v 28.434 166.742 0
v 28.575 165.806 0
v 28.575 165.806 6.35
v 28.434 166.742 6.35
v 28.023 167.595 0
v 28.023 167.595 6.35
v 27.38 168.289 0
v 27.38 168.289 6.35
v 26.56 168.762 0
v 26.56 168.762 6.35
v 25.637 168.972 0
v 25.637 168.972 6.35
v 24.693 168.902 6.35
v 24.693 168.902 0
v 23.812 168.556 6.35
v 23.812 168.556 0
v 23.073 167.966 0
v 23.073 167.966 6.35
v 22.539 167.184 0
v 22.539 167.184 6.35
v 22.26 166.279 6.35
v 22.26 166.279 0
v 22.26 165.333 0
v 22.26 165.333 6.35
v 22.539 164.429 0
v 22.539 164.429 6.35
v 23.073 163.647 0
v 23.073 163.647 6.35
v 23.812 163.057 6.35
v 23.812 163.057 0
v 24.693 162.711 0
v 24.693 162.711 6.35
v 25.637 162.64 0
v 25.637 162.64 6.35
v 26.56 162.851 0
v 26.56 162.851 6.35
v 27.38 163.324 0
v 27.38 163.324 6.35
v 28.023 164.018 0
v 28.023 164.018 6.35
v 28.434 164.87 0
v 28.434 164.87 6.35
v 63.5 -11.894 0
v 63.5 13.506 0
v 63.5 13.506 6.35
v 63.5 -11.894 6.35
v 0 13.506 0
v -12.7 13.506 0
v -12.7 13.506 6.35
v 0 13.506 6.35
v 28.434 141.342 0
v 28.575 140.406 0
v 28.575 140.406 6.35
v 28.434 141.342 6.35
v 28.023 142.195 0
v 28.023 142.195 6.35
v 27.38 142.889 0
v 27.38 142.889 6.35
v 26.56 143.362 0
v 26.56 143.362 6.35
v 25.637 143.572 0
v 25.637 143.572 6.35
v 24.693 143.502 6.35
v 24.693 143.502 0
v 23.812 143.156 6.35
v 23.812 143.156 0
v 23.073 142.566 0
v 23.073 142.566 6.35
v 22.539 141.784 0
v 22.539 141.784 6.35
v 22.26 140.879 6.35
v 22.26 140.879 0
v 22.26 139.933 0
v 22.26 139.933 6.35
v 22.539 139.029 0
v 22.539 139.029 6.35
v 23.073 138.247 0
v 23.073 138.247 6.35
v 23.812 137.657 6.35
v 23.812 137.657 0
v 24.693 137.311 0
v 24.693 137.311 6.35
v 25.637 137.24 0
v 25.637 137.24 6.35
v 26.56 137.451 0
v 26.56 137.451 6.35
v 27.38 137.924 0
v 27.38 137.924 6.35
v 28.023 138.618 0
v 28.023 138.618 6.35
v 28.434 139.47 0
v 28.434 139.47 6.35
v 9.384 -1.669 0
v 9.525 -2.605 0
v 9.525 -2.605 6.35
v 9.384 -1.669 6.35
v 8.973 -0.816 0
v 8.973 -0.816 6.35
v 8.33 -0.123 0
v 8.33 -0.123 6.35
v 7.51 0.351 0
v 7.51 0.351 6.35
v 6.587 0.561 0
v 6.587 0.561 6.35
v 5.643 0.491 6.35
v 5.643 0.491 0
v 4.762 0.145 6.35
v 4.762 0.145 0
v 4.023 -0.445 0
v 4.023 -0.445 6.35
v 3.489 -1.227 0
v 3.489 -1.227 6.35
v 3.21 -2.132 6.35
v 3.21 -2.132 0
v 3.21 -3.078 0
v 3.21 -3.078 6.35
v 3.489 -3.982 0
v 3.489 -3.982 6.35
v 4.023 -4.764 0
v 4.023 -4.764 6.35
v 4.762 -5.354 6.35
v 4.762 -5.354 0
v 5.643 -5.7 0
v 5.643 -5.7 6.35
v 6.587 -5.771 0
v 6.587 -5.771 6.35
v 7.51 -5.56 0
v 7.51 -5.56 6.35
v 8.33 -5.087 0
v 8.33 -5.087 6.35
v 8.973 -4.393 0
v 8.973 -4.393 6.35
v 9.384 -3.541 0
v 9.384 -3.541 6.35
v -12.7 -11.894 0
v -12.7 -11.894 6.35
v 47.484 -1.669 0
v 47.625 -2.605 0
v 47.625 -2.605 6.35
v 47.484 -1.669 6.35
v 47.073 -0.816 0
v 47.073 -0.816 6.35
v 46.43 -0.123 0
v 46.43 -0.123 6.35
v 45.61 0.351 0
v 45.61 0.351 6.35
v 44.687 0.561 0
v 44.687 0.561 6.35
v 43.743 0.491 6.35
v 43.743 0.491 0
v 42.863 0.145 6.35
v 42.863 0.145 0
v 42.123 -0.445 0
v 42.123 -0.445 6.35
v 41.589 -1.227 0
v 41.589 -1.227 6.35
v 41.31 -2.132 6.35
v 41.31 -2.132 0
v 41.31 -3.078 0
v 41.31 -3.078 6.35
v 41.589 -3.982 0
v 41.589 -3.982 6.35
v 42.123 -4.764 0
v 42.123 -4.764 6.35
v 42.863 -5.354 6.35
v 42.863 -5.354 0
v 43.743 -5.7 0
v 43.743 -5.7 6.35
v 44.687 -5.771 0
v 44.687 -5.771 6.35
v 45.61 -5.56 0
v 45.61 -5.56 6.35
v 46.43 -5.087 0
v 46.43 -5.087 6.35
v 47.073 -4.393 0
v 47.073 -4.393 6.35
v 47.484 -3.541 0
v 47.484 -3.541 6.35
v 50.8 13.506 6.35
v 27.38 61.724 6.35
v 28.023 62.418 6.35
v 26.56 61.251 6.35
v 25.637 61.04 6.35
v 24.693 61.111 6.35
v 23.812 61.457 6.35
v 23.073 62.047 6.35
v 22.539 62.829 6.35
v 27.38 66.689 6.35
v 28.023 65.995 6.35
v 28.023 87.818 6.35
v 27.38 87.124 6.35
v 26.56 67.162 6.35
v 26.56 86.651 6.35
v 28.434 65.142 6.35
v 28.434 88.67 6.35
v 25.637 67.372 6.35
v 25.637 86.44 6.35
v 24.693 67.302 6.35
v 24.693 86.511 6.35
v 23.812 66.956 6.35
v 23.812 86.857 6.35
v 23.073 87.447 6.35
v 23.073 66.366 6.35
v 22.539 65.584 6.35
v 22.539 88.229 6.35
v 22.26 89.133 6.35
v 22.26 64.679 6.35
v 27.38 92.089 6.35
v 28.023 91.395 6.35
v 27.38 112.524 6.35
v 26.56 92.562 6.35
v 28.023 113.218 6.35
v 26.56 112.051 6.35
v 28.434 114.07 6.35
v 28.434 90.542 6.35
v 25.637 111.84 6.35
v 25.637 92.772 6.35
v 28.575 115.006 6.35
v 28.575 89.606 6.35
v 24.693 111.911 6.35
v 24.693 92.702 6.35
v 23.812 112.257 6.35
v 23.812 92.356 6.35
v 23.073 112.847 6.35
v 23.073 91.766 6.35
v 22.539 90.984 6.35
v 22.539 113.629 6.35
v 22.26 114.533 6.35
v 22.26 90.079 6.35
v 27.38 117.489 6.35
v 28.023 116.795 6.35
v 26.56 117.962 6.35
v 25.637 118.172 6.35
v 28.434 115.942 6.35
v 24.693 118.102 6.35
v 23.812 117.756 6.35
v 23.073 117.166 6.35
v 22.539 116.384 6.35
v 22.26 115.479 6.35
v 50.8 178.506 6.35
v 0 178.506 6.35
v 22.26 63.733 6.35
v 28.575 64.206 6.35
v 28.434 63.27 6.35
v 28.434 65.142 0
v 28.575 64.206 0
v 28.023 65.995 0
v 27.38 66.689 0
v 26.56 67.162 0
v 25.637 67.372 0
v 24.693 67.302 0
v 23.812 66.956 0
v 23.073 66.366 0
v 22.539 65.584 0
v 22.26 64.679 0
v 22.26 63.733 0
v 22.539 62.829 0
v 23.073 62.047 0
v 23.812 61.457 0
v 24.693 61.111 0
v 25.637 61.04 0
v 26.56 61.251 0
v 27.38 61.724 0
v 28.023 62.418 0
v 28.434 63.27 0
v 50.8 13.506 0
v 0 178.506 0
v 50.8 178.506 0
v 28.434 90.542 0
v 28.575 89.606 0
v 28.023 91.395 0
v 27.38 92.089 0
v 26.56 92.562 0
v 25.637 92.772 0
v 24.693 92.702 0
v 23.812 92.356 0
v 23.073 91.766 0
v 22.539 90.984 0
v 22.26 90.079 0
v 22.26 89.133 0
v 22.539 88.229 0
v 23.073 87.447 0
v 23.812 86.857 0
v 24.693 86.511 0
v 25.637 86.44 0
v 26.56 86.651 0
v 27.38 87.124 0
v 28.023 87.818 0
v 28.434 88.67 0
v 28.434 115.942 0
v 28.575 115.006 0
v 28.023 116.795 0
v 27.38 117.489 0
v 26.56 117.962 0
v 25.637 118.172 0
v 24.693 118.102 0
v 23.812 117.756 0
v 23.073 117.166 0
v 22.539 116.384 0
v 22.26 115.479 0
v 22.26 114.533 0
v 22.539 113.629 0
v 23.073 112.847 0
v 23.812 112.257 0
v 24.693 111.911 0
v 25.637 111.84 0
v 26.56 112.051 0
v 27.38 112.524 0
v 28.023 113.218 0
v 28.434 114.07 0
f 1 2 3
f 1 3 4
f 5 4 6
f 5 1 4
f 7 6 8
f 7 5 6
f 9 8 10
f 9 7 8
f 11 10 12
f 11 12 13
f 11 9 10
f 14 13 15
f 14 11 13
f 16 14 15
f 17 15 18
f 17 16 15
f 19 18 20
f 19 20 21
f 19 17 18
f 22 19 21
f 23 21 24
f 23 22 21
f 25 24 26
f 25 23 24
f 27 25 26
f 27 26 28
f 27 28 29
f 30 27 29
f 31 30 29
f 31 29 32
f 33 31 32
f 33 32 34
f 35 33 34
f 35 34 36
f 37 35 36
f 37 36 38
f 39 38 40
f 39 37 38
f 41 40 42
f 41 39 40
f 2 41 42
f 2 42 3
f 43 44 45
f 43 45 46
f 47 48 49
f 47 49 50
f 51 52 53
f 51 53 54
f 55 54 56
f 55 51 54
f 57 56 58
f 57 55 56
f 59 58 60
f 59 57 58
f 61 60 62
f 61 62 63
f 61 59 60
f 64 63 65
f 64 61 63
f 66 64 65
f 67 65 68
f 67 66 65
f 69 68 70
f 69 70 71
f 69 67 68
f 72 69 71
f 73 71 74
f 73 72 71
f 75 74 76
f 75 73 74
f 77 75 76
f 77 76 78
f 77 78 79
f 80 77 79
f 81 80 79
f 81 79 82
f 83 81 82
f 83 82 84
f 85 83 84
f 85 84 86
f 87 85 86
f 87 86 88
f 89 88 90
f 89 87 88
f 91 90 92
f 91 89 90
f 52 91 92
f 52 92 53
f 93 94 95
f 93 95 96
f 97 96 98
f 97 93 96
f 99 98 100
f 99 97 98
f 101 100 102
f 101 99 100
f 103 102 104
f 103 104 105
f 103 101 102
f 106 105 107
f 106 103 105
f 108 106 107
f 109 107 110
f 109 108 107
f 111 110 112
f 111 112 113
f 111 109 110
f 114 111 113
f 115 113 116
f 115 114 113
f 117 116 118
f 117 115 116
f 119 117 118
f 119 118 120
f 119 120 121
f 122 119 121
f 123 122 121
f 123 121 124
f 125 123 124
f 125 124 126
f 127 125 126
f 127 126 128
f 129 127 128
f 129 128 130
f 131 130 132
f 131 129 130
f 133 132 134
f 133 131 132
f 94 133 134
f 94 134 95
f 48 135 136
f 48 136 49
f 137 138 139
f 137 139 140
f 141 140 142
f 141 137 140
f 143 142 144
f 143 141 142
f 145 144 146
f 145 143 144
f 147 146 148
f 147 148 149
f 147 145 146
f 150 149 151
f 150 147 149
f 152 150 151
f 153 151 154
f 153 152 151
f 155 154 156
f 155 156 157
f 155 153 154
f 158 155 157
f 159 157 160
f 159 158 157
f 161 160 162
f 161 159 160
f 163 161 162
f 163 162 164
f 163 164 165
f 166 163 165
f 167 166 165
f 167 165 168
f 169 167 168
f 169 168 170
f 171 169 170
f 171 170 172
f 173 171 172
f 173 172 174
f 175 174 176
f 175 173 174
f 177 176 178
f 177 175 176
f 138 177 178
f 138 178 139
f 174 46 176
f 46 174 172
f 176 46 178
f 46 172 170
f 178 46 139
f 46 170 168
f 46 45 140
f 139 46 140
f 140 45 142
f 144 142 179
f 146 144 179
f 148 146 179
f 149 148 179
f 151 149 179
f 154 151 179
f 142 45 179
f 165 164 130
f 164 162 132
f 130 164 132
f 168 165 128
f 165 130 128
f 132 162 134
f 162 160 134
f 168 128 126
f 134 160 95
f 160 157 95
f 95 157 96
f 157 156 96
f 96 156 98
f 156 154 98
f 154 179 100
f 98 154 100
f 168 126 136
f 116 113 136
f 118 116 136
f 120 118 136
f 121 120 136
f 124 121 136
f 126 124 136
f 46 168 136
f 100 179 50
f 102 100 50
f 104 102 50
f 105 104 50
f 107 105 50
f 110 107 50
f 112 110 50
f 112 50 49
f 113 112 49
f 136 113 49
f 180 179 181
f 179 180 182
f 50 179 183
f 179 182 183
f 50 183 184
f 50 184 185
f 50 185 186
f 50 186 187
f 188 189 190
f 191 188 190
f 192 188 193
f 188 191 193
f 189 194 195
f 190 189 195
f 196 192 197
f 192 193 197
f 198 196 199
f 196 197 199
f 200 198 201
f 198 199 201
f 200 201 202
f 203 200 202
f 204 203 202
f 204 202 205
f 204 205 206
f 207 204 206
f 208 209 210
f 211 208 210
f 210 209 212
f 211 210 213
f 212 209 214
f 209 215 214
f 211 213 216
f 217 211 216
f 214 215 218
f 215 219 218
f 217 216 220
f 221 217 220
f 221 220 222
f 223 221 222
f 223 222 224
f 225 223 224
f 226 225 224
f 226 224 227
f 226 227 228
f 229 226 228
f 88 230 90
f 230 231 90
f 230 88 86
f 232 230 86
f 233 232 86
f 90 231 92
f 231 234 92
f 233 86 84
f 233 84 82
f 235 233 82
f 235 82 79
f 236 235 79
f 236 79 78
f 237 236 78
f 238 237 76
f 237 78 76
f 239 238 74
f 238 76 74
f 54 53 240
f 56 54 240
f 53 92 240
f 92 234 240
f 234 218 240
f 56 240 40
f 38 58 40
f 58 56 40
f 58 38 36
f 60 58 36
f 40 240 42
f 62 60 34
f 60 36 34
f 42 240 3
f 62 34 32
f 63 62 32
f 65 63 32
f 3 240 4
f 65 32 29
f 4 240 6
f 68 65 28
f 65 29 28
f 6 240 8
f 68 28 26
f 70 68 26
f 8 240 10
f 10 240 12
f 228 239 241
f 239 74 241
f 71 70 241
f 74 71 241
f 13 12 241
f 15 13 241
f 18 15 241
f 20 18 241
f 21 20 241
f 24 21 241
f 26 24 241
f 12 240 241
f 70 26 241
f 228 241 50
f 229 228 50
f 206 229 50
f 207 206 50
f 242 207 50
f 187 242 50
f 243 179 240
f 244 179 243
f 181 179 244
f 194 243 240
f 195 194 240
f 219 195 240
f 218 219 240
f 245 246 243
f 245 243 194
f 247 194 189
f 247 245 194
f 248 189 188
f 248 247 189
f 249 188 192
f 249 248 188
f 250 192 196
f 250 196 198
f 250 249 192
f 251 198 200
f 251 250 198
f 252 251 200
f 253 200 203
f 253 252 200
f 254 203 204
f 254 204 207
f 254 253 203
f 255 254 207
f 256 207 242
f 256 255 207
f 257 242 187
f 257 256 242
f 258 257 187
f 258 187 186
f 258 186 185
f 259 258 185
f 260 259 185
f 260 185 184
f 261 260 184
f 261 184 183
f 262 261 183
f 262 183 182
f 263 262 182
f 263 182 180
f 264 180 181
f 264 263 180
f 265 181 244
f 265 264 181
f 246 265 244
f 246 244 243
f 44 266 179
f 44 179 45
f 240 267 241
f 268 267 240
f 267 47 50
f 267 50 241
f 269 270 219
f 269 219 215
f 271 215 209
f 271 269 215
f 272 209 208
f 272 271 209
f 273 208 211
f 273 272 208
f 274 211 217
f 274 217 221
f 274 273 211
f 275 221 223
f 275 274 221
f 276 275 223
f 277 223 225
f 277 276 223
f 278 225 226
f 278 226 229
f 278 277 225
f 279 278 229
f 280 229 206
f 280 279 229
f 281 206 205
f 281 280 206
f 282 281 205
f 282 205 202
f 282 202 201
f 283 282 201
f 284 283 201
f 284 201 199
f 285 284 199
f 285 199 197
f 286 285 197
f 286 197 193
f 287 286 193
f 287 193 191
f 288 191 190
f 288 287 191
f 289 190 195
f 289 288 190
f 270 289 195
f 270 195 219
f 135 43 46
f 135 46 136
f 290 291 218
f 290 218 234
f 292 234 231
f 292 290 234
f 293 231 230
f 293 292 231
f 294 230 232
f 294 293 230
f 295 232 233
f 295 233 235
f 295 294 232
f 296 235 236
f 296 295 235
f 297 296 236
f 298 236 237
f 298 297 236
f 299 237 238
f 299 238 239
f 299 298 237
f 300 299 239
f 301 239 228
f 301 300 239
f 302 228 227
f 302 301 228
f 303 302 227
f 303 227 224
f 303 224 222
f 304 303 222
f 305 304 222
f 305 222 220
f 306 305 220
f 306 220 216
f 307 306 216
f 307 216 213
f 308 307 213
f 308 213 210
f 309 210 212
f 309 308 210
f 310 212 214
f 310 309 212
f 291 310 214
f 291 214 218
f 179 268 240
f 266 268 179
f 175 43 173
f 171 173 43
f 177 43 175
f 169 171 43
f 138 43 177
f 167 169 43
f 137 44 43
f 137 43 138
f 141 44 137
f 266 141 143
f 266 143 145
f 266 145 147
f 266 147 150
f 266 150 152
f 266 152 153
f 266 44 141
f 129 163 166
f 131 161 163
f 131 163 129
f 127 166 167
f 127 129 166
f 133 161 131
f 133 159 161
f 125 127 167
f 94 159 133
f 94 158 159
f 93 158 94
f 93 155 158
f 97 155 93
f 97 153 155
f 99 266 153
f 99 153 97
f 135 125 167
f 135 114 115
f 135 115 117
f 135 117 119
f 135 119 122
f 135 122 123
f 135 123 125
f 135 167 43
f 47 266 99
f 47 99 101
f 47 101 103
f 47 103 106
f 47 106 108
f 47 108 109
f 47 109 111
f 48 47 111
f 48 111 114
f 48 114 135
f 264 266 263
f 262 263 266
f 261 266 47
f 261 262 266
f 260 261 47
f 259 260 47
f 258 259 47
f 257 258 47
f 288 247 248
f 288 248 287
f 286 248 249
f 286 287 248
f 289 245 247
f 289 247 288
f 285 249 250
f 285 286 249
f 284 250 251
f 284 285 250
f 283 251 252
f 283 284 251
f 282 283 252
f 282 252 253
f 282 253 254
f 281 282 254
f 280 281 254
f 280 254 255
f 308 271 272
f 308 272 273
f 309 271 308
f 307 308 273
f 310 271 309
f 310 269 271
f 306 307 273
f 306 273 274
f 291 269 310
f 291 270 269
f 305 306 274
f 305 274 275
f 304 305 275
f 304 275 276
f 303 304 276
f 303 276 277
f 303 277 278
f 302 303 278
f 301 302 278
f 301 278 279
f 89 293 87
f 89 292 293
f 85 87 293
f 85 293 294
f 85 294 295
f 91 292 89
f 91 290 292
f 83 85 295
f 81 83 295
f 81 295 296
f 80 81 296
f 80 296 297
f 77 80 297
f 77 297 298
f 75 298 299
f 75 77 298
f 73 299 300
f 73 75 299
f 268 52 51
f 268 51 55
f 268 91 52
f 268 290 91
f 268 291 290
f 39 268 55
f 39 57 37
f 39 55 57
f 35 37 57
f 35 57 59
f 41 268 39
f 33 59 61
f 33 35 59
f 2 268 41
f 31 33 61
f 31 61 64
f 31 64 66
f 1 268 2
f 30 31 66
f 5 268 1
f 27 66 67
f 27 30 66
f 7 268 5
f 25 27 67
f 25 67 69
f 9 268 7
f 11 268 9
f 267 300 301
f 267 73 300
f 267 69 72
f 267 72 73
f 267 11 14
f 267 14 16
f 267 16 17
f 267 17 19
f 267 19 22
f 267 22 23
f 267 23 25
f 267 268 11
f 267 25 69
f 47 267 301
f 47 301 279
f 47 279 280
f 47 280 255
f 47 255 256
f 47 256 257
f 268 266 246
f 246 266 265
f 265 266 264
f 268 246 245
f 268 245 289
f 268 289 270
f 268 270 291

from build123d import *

# Parameters (mm, degrees)
SKETCH1_R           = 3.175
BOSS_EXTRUDE1_DEPTH = 6.35


with BuildPart() as part:
    # Sketch1 → Boss-Extrude1 (new body)
    with BuildSketch(Plane.XY):
        Polygon((0, 13.506188545), (0, 178.506188545), (50.8, 178.506188545), (50.8, 13.506188545), (63.5, 13.506188545), (63.5, -11.893811455), (-12.7, -11.893811455), (-12.7, 13.506188545), align=None)
        with Locations((6.35, -2.604847725)):
            Circle(SKETCH1_R, mode=Mode.SUBTRACT)
        with Locations((44.45, -2.604847725)):
            Circle(SKETCH1_R, mode=Mode.SUBTRACT)
        with Locations((25.4, 165.806188545)):
            Circle(SKETCH1_R, mode=Mode.SUBTRACT)
        with Locations((25.4, 140.406188545)):
            Circle(SKETCH1_R, mode=Mode.SUBTRACT)
        with Locations((25.4, 115.006188545)):
            Circle(SKETCH1_R, mode=Mode.SUBTRACT)
        with Locations((25.4, 89.606188545)):
            Circle(SKETCH1_R, mode=Mode.SUBTRACT)
        with Locations((25.4, 64.206188545)):
            Circle(SKETCH1_R, mode=Mode.SUBTRACT)
    extrude(amount=BOSS_EXTRUDE1_DEPTH)


solid = part.part
